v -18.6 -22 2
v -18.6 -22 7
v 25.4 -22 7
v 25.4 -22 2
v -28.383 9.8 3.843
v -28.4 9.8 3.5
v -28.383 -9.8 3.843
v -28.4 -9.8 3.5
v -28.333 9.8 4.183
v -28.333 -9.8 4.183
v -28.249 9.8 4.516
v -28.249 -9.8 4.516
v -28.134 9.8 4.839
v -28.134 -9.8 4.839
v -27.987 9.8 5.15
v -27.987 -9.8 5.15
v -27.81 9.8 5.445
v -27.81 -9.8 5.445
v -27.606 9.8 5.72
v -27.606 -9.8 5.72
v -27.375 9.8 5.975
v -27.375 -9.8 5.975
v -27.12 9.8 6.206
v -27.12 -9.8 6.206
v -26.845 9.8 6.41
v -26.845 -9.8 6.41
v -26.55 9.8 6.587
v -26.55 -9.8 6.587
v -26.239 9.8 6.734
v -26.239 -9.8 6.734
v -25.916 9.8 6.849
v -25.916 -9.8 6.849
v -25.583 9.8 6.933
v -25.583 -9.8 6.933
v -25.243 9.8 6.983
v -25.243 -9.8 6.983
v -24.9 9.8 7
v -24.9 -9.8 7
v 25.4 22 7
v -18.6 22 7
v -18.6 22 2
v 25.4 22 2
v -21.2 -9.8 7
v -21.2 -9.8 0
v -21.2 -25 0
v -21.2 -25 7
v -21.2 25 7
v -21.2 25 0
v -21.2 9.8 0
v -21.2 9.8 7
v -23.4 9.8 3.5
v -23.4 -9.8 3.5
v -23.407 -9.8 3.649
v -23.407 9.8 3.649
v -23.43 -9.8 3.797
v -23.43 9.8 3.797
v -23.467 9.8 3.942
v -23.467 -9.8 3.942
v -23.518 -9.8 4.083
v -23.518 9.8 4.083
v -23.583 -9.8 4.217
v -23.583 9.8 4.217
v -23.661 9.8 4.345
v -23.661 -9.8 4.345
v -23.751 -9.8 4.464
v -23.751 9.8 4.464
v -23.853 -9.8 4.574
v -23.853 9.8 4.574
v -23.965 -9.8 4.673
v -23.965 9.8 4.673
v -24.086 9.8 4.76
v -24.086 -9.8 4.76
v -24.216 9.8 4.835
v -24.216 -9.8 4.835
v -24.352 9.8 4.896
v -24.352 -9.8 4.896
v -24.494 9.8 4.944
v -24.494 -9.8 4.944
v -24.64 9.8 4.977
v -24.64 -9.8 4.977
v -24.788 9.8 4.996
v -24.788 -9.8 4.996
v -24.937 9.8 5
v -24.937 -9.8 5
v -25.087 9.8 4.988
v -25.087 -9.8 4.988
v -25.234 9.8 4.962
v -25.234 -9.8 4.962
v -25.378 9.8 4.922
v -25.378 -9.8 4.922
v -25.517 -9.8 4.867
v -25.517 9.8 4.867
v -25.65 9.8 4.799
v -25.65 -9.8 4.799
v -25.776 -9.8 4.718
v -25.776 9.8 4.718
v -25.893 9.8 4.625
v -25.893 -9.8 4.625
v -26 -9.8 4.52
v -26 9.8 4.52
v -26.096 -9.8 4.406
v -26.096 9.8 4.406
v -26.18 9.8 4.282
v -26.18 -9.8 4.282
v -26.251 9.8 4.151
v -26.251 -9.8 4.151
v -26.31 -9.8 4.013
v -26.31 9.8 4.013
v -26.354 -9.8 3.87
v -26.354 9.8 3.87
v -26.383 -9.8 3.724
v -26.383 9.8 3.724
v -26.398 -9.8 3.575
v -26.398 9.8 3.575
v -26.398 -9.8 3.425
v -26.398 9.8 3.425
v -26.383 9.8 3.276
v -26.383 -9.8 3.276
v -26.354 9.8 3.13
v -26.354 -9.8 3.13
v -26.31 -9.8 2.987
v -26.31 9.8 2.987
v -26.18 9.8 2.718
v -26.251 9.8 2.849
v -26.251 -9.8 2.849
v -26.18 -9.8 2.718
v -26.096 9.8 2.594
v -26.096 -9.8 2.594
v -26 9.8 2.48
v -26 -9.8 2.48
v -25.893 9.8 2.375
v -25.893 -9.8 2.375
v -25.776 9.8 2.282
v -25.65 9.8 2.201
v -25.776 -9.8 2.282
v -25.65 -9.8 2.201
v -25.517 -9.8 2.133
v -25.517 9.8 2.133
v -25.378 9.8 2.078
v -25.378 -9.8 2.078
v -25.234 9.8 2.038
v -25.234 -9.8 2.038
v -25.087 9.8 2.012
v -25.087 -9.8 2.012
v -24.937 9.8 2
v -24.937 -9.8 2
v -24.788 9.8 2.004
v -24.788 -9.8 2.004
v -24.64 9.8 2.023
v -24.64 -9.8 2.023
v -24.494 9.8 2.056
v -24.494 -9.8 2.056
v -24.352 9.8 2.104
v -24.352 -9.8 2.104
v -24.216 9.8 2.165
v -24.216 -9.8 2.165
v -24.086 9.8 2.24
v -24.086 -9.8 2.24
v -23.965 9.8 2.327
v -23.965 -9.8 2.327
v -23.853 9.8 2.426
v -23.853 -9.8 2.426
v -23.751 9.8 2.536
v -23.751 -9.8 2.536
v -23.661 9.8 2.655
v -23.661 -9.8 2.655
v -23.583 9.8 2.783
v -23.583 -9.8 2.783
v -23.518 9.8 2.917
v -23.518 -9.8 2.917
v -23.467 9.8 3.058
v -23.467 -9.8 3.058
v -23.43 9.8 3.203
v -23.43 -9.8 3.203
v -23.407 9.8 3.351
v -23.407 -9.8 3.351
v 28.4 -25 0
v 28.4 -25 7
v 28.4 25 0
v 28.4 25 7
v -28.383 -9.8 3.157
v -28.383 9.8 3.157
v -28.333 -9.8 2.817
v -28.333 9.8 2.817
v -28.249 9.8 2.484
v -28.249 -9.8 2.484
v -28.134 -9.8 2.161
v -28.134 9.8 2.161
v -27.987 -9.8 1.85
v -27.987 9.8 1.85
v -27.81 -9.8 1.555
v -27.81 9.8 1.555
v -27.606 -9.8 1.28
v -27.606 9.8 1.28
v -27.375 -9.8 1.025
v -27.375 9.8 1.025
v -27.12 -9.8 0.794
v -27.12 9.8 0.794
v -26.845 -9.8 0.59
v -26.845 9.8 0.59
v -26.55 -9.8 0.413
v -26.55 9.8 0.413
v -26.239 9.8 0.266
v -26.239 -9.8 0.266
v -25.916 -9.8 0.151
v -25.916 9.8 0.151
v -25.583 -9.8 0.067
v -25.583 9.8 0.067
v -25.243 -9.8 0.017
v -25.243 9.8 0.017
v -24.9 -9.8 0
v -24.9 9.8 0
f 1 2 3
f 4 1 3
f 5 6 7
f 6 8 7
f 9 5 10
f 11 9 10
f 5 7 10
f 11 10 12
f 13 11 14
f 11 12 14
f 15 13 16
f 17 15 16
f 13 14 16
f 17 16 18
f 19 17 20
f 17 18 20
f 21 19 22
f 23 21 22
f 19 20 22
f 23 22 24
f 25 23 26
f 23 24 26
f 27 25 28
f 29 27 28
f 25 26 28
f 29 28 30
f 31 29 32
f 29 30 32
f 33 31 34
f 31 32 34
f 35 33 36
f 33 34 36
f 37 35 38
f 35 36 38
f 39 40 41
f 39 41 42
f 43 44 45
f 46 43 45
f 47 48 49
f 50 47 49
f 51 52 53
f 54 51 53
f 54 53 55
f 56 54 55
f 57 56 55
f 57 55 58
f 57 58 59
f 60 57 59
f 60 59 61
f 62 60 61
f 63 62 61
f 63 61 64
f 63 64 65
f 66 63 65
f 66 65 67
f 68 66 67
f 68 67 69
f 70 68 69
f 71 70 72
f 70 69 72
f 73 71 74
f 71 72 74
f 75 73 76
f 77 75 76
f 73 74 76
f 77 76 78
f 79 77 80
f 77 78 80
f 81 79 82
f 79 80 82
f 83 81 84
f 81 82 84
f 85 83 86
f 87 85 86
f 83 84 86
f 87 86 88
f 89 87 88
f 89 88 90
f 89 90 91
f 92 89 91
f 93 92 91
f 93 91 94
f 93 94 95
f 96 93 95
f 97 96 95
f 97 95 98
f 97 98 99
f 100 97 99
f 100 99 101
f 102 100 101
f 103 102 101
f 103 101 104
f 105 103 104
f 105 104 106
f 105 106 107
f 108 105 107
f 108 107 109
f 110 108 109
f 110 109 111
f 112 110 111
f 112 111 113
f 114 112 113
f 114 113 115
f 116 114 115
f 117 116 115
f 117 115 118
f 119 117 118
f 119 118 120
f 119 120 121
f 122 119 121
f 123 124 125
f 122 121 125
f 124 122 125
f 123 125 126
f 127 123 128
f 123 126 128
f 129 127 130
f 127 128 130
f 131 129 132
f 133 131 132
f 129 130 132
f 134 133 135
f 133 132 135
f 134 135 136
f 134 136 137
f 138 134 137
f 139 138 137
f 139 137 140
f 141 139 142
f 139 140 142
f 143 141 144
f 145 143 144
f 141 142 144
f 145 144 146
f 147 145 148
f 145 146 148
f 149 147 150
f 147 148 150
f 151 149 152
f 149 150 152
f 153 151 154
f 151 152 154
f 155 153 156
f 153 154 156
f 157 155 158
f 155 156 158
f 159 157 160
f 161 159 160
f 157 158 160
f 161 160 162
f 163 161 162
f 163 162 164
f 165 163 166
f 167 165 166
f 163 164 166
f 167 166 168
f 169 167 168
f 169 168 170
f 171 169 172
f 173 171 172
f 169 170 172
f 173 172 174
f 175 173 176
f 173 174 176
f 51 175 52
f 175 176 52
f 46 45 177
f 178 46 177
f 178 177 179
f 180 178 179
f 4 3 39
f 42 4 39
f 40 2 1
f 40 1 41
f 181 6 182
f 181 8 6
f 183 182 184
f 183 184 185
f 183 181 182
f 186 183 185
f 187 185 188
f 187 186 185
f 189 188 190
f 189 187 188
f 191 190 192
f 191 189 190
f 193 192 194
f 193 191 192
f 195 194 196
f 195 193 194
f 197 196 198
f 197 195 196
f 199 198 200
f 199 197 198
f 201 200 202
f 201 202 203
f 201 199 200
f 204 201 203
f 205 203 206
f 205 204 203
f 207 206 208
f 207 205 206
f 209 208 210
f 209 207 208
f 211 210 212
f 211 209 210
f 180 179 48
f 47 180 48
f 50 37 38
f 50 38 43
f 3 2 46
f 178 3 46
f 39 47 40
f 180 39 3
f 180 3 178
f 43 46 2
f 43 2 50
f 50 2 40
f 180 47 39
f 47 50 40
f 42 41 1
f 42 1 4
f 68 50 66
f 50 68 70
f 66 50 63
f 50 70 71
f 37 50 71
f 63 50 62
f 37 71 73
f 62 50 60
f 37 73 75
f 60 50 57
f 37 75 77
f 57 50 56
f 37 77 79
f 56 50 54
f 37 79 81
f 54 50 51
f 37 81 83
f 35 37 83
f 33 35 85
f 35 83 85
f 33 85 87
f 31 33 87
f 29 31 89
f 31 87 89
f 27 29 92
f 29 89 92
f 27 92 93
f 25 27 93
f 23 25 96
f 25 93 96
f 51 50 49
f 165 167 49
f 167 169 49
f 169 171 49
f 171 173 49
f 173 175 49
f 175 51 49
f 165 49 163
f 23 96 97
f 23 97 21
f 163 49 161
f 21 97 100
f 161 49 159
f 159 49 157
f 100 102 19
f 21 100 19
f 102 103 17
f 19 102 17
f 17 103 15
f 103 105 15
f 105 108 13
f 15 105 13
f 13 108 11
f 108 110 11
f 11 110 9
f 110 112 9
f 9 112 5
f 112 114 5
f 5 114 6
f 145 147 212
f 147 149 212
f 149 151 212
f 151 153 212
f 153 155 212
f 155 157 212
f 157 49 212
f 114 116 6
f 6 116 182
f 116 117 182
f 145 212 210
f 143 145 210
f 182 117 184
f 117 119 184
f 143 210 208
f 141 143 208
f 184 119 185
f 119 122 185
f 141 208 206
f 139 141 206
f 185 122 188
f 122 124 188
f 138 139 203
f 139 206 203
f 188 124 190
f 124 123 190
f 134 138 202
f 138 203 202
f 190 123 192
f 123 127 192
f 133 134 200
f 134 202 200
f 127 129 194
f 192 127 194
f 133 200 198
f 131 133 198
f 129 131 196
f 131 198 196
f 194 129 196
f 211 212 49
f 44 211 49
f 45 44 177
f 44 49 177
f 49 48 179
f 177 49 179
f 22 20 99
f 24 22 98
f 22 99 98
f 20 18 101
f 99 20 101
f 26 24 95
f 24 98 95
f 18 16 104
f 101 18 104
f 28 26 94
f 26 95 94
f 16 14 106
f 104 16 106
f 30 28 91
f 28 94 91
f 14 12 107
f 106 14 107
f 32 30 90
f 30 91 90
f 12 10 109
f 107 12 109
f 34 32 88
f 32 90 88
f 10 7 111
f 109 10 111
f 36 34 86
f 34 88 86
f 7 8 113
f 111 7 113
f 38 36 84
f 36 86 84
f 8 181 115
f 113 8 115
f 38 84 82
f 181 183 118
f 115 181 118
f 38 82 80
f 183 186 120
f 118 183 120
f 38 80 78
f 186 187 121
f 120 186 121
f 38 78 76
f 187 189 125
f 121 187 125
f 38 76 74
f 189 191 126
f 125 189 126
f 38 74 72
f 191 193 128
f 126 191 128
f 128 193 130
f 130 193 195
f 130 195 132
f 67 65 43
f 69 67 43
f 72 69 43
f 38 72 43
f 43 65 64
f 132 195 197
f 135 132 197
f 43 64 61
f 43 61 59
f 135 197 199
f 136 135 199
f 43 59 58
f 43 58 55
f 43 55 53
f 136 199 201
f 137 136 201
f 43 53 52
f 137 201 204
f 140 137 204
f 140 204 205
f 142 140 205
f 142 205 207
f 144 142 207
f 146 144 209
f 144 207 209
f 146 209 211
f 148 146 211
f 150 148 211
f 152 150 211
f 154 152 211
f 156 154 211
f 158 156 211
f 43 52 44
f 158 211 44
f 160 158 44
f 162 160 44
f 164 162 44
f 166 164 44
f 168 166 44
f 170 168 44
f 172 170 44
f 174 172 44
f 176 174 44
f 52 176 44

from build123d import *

# Parameters (mm, degrees)
F1_DEPTH = 7
F2_R     = 3.49999
F4_D     = 3
F5_W     = 44
F5_H     = 44
F6_DEPTH = 5


# Not quite as in the source:
# - a fillet or chamfer is up to 0.001 mm smaller than in the source, because OpenCascade refuses the exact size


with BuildPart() as f1:
    # F0 (on Top) → F1 (new body)
    with BuildSketch(Plane.XY):
        Polygon((28.4, 25), (-21.2, 25), (-21.2, 9.8), (-28.4, 9.8), (-28.4, -9.8), (-21.2, -9.8), (-21.2, -25), (28.4, -25), align=None)
    extrude(amount=F1_DEPTH)

    # F2 (radius 3.5 in the source; OpenCascade refuses exactly that, so slightly less here)
    f2_edges = [f1.edges().sort_by_distance(p)[0] for p in [
        (-28.4, 0, 7),
        (-28.4, 0, 0),
    ]]
    fillet(f2_edges, radius=F2_R)

    # F4 (through all)
    with Locations(Plane(origin=(0, 9.8, 0), x_dir=(-1, 0, 0), z_dir=(0, 1, 0))):
        with Locations((24.9, 3.5)):
            Hole(F4_D / 2)

    # F5 (on face) → F6 (cut)
    with BuildSketch(Plane.XY.offset(7)):
        with Locations((3.4, 0)):
            Rectangle(F5_W, F5_H)
    extrude(amount=-F6_DEPTH, mode=Mode.SUBTRACT)


solid = f1.part
